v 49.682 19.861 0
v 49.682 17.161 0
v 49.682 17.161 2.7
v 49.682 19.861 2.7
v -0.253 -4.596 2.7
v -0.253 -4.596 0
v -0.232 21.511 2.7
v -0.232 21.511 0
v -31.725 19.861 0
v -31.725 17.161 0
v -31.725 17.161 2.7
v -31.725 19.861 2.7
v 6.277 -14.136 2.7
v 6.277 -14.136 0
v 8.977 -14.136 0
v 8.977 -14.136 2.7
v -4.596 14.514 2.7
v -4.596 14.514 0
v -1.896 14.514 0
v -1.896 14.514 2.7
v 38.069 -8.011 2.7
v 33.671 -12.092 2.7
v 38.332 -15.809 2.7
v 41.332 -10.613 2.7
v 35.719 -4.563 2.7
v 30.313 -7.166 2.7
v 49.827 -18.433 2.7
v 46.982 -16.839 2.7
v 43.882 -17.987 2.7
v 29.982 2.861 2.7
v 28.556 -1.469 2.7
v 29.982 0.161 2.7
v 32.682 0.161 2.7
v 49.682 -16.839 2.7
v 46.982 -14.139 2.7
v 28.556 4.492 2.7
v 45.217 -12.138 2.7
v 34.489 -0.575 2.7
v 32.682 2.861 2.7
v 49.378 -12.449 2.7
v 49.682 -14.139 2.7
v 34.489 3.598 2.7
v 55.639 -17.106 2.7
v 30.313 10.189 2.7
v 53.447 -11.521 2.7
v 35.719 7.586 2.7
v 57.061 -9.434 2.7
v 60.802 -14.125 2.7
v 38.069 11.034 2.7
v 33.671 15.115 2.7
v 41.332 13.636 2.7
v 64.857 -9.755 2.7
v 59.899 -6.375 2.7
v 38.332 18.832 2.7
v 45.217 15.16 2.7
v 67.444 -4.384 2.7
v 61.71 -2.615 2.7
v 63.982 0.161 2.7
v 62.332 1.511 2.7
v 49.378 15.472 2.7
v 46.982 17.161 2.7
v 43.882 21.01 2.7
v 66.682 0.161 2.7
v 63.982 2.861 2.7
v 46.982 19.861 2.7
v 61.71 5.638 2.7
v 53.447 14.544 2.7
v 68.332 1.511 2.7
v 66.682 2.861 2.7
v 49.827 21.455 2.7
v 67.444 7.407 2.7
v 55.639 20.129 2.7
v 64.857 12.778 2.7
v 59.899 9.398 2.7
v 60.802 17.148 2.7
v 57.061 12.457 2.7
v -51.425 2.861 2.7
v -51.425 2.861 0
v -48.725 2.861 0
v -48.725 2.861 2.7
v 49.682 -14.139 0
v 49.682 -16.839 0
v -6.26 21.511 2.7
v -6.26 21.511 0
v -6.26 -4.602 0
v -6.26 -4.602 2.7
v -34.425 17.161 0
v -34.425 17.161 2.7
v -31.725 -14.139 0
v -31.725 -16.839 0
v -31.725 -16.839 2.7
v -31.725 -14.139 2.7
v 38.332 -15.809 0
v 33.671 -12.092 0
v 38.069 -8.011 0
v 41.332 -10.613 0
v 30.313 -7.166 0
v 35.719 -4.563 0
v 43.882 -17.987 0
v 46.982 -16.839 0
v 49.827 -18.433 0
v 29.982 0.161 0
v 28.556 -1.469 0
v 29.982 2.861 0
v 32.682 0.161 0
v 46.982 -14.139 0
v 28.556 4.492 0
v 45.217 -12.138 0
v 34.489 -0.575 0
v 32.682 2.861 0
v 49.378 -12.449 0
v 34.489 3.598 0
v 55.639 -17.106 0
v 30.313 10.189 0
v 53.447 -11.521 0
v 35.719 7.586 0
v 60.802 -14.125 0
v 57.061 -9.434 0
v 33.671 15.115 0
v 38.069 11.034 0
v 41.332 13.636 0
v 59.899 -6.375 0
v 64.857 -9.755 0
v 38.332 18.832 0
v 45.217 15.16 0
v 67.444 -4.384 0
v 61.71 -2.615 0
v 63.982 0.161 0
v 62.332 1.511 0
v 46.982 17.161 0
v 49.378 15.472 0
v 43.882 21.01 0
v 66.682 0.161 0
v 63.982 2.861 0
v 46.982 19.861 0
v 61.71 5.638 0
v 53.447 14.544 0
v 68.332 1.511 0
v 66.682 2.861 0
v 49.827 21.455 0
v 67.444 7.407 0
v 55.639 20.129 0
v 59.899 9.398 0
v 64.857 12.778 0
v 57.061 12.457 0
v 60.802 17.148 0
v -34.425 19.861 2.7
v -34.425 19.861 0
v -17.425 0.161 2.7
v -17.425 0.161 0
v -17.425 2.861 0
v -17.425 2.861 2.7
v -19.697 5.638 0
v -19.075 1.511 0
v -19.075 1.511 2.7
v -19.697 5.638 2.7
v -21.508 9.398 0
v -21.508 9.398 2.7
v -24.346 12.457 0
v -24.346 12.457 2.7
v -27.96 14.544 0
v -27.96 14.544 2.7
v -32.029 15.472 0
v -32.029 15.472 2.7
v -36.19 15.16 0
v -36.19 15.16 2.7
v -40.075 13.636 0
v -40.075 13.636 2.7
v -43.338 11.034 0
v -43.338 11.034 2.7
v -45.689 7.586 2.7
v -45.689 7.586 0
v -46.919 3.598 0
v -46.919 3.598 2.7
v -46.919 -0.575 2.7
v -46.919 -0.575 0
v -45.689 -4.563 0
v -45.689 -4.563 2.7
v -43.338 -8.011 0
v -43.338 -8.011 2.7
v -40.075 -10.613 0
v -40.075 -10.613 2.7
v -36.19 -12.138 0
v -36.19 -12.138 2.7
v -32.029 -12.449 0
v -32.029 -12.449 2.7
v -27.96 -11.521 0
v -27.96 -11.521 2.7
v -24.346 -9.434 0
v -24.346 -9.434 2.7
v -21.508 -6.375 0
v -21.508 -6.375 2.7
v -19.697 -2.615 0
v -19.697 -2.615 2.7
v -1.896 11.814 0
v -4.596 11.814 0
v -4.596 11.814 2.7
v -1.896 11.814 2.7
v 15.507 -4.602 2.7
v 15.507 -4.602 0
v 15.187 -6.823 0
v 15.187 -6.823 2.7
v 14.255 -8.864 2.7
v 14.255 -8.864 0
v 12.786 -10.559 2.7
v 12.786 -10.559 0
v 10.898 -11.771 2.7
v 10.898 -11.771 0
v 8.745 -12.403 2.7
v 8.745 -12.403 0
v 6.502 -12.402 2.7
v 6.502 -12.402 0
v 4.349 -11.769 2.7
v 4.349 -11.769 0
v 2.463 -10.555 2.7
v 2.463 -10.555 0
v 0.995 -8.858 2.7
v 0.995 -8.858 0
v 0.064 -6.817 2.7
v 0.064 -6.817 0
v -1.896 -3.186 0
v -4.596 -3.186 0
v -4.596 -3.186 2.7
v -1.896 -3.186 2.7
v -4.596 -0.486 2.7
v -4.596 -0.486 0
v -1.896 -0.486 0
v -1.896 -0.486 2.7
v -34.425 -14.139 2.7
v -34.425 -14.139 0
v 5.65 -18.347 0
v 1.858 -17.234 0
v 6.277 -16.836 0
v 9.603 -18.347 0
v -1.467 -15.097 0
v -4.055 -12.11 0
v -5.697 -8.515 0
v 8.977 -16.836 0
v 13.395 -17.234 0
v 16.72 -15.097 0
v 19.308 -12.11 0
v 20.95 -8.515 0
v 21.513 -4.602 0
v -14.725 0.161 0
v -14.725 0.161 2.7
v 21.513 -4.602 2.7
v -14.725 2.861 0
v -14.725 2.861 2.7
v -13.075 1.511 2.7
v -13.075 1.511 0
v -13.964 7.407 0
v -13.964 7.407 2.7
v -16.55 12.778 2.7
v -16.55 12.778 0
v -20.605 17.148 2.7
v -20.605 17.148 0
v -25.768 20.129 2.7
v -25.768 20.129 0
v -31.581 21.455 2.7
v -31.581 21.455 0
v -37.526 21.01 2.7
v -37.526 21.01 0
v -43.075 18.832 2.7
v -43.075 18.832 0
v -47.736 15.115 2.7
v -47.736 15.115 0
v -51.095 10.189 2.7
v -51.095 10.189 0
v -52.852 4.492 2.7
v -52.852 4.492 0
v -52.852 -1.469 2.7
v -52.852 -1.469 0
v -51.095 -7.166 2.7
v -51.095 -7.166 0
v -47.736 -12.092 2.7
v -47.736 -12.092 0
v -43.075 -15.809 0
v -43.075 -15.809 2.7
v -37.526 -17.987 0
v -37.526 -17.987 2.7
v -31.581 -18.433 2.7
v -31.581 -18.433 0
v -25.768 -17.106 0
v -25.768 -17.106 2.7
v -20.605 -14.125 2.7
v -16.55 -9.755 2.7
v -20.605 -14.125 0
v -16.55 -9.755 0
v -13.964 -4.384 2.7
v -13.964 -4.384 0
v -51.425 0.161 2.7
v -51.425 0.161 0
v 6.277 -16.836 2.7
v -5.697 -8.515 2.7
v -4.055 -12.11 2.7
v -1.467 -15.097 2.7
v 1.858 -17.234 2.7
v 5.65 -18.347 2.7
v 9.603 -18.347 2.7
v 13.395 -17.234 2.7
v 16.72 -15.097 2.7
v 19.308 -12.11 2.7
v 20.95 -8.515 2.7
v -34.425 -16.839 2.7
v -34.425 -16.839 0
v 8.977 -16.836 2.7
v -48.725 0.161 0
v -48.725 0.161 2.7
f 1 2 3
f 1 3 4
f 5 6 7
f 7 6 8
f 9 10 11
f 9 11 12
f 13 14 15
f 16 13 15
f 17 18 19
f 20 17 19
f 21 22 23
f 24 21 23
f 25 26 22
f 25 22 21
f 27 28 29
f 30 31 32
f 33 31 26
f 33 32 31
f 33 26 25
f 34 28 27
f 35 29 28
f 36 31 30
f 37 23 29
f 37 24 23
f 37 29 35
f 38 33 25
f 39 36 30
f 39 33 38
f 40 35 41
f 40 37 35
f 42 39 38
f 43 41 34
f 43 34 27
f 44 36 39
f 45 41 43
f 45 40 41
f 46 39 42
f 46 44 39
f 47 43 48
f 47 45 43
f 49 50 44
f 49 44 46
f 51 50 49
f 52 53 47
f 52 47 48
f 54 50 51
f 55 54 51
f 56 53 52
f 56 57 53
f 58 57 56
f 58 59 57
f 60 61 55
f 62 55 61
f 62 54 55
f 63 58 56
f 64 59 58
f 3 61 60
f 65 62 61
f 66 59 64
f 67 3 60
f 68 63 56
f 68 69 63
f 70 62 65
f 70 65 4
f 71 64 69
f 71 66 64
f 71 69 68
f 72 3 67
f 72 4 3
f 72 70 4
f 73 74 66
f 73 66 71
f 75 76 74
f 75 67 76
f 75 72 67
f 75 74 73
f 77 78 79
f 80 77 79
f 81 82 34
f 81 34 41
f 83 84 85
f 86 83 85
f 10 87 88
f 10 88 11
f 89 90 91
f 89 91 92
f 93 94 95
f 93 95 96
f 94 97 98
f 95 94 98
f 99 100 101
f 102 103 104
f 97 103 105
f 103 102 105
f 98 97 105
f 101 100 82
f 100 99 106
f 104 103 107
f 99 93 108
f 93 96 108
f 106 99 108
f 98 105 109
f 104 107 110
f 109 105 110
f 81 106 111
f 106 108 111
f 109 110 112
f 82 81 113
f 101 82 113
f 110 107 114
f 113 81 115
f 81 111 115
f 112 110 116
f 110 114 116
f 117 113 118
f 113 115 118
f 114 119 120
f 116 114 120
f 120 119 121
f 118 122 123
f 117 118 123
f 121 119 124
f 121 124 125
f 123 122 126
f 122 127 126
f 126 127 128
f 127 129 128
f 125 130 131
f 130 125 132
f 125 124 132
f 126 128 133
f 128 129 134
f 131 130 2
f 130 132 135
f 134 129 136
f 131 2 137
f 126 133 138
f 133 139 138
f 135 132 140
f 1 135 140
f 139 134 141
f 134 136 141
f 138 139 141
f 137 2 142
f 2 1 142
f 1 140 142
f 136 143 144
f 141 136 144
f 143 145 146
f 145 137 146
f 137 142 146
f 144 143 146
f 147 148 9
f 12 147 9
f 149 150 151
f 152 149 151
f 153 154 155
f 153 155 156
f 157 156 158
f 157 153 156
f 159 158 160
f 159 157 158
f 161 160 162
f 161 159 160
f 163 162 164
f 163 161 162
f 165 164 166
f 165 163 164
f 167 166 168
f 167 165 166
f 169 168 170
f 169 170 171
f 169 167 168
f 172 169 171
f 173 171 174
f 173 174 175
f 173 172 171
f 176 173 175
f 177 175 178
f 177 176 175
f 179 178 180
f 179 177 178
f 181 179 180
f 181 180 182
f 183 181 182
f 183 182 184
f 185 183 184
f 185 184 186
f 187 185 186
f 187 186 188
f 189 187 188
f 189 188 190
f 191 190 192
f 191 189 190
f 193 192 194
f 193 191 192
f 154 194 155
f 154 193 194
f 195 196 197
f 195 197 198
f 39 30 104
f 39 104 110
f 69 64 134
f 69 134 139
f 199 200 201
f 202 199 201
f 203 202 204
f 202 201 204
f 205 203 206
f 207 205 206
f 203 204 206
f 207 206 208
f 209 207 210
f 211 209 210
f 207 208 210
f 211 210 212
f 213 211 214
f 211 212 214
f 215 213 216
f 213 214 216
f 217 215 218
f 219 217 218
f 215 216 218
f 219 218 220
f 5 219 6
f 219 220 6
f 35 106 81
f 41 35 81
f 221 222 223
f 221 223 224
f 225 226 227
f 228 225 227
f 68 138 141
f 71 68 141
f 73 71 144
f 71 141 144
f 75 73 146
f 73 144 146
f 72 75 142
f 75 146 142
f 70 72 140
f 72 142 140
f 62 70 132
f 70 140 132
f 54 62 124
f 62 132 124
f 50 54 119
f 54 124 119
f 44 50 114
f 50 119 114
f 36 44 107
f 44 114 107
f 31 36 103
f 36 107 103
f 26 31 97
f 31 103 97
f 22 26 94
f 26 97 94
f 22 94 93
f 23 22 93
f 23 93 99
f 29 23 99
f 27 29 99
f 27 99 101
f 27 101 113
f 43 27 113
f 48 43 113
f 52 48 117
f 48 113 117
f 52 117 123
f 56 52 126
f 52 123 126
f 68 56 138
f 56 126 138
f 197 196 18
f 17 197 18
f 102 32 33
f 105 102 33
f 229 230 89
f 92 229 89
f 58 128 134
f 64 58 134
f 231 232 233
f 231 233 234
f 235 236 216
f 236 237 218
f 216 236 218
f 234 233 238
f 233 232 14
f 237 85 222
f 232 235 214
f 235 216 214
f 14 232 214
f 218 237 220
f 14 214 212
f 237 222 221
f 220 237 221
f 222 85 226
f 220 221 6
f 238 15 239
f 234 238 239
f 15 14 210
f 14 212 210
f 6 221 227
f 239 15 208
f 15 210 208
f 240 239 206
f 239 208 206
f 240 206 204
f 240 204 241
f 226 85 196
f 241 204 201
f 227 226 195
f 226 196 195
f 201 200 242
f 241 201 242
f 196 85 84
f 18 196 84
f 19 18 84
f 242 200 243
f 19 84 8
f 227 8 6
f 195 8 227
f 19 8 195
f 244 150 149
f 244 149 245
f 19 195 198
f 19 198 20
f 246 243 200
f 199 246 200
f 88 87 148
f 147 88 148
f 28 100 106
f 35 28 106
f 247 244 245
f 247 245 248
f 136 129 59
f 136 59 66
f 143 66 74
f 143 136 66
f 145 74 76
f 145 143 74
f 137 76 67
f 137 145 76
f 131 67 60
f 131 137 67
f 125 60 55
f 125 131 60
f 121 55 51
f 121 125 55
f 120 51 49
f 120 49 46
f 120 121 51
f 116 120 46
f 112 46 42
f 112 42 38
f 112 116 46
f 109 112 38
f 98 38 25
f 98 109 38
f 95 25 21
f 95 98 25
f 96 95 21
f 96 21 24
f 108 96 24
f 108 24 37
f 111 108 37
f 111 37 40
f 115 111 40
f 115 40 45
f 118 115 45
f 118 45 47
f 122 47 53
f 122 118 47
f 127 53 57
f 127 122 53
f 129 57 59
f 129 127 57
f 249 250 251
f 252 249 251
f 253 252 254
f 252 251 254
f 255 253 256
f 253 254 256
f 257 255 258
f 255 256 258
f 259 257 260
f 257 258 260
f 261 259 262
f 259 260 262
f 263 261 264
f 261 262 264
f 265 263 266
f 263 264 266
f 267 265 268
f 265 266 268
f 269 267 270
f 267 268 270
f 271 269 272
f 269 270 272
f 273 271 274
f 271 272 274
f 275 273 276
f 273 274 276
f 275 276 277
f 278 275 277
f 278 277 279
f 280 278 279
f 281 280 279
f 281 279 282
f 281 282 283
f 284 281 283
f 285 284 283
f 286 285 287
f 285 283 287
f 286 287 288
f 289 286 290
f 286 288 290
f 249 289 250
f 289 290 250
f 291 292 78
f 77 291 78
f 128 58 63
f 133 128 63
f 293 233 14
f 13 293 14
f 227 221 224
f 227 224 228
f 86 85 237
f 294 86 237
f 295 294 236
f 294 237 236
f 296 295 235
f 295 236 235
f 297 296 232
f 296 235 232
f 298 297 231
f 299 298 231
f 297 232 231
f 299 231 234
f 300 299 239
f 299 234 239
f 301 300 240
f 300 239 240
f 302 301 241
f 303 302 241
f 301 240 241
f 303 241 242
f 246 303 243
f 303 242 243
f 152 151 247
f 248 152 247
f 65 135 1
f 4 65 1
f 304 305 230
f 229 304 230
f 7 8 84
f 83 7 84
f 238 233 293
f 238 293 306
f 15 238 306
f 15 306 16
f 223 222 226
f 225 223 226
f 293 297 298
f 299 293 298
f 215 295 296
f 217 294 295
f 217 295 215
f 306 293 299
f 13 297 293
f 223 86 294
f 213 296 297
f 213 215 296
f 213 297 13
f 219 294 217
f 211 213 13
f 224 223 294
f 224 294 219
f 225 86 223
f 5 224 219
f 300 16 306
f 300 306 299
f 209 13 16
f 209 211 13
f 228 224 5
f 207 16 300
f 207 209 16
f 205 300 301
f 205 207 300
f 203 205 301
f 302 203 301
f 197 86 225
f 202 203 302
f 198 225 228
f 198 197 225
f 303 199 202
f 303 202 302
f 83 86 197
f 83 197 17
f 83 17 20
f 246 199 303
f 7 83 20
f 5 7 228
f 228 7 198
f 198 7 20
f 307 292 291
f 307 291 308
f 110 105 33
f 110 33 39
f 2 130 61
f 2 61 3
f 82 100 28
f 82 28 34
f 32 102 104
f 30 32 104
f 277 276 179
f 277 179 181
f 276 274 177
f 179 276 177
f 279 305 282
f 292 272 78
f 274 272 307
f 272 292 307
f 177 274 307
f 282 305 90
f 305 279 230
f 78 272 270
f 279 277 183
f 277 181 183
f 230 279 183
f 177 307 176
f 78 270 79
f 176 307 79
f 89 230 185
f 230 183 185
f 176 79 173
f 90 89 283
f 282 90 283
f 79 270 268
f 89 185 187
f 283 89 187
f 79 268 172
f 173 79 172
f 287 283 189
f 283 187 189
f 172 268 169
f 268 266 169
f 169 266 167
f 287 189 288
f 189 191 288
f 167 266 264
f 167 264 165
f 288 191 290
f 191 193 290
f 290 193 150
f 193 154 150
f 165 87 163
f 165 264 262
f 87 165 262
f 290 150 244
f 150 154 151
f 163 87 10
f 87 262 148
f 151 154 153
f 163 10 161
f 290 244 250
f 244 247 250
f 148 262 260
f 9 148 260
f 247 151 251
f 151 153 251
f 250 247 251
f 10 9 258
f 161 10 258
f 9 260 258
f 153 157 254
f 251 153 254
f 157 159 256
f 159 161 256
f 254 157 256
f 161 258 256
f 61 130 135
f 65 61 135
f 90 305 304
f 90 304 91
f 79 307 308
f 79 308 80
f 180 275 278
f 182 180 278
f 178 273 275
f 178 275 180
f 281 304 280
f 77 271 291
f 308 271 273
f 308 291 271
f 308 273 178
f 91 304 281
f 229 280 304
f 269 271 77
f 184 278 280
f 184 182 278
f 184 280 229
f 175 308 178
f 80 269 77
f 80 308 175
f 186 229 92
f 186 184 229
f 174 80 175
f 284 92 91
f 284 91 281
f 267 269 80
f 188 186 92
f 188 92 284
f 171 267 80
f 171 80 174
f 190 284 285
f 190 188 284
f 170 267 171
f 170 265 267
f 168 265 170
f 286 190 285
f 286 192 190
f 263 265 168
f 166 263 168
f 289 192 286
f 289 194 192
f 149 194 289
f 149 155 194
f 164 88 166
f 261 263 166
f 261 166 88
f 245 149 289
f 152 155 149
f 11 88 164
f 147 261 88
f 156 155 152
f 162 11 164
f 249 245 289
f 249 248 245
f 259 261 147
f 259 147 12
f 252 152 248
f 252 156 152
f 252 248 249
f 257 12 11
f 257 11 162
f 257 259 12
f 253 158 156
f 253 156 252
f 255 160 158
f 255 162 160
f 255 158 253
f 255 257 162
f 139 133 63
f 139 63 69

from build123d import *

# Parameters (mm, degrees)
SKETCH1_R             = 20
SKETCH1_R_2           = 14
SKETCH1_W             = 2.7
SKETCH1_H             = 2.7
BOSS_EXTRUDE3_DEPTH   = 2.7
BOSS_EXTRUDE3_2_DEPTH = 2.7
BOSS_EXTRUDE3_3_DEPTH = 2.7


with BuildPart() as part:
    # Sketch1 → Boss-Extrude3 (new body)
    with BuildSketch(Plane.XY):
        with Locations((48.332142187, 1.511416081)):
            Circle(SKETCH1_R)
        with Locations((48.332142187, 1.511416081)):
            Circle(SKETCH1_R_2, mode=Mode.SUBTRACT)
        with Locations((65.332142187, 1.511416081)):
            Rectangle(SKETCH1_W, SKETCH1_H, mode=Mode.SUBTRACT)
        with Locations((48.332142187, 18.511416081)):
            Rectangle(SKETCH1_W, SKETCH1_H, mode=Mode.SUBTRACT)
        with Locations((48.332142187, -15.488583919)):
            Rectangle(SKETCH1_W, SKETCH1_H, mode=Mode.SUBTRACT)
        with Locations((31.332142187, 1.511416081)):
            Rectangle(SKETCH1_W, SKETCH1_H, mode=Mode.SUBTRACT)
    extrude(amount=BOSS_EXTRUDE3_DEPTH)


with BuildPart() as body_2:
    # Sketch1 → Boss-Extrude3 2 (new body)
    with BuildSketch(Plane.XY):
        with Locations((-33.07519389, 1.511416081)):
            Circle(SKETCH1_R)
        with Locations((-33.07519389, 1.511416081)):
            Circle(SKETCH1_R_2, mode=Mode.SUBTRACT)
        with Locations((-16.07519389, 1.511416081)):
            Rectangle(SKETCH1_W, SKETCH1_H, mode=Mode.SUBTRACT)
        with Locations((-33.07519389, -15.488583919)):
            Rectangle(SKETCH1_W, SKETCH1_H, mode=Mode.SUBTRACT)
        with Locations((-33.07519389, 18.511416081)):
            Rectangle(SKETCH1_W, SKETCH1_H, mode=Mode.SUBTRACT)
        with Locations((-50.07519389, 1.511416081)):
            Rectangle(SKETCH1_W, SKETCH1_H, mode=Mode.SUBTRACT)
    extrude(amount=BOSS_EXTRUDE3_2_DEPTH)


with BuildPart() as body_3:
    # Sketch1 → Boss-Extrude3 3 (new body)
    with BuildSketch(Plane.XY):
        with BuildLine():
            Line((21.512673122, -4.602466422), (15.506554204, -4.602466422))
            ThreePointArc((15.506554204, -4.602466422), (7.62336958, -12.48246449), (-0.253440643, -4.596094597))
            Line((-0.253440643, -4.596094597), (-0.232329911, 21.511416082))
            Line((-0.232329911, 21.511416082), (-6.259562137, 21.511416082))
            Line((-6.259562137, 21.511416082), (-6.259562137, -4.602466422))
            ThreePointArc((-6.259562137, -4.602466422), (7.626555493, -18.488584051), (21.512673122, -4.602466422))
        make_face()
        with Locations((-3.245946024, -1.835659199)):
            Rectangle(SKETCH1_W, SKETCH1_H, mode=Mode.SUBTRACT)
        with Locations((-3.245946024, 13.164340801)):
            Rectangle(SKETCH1_W, SKETCH1_H, mode=Mode.SUBTRACT)
        with Locations((7.626555493, -15.485524593)):
            Rectangle(SKETCH1_W, SKETCH1_H, mode=Mode.SUBTRACT)
    extrude(amount=BOSS_EXTRUDE3_3_DEPTH)


solid = Compound([part.part, body_2.part, body_3.part])
